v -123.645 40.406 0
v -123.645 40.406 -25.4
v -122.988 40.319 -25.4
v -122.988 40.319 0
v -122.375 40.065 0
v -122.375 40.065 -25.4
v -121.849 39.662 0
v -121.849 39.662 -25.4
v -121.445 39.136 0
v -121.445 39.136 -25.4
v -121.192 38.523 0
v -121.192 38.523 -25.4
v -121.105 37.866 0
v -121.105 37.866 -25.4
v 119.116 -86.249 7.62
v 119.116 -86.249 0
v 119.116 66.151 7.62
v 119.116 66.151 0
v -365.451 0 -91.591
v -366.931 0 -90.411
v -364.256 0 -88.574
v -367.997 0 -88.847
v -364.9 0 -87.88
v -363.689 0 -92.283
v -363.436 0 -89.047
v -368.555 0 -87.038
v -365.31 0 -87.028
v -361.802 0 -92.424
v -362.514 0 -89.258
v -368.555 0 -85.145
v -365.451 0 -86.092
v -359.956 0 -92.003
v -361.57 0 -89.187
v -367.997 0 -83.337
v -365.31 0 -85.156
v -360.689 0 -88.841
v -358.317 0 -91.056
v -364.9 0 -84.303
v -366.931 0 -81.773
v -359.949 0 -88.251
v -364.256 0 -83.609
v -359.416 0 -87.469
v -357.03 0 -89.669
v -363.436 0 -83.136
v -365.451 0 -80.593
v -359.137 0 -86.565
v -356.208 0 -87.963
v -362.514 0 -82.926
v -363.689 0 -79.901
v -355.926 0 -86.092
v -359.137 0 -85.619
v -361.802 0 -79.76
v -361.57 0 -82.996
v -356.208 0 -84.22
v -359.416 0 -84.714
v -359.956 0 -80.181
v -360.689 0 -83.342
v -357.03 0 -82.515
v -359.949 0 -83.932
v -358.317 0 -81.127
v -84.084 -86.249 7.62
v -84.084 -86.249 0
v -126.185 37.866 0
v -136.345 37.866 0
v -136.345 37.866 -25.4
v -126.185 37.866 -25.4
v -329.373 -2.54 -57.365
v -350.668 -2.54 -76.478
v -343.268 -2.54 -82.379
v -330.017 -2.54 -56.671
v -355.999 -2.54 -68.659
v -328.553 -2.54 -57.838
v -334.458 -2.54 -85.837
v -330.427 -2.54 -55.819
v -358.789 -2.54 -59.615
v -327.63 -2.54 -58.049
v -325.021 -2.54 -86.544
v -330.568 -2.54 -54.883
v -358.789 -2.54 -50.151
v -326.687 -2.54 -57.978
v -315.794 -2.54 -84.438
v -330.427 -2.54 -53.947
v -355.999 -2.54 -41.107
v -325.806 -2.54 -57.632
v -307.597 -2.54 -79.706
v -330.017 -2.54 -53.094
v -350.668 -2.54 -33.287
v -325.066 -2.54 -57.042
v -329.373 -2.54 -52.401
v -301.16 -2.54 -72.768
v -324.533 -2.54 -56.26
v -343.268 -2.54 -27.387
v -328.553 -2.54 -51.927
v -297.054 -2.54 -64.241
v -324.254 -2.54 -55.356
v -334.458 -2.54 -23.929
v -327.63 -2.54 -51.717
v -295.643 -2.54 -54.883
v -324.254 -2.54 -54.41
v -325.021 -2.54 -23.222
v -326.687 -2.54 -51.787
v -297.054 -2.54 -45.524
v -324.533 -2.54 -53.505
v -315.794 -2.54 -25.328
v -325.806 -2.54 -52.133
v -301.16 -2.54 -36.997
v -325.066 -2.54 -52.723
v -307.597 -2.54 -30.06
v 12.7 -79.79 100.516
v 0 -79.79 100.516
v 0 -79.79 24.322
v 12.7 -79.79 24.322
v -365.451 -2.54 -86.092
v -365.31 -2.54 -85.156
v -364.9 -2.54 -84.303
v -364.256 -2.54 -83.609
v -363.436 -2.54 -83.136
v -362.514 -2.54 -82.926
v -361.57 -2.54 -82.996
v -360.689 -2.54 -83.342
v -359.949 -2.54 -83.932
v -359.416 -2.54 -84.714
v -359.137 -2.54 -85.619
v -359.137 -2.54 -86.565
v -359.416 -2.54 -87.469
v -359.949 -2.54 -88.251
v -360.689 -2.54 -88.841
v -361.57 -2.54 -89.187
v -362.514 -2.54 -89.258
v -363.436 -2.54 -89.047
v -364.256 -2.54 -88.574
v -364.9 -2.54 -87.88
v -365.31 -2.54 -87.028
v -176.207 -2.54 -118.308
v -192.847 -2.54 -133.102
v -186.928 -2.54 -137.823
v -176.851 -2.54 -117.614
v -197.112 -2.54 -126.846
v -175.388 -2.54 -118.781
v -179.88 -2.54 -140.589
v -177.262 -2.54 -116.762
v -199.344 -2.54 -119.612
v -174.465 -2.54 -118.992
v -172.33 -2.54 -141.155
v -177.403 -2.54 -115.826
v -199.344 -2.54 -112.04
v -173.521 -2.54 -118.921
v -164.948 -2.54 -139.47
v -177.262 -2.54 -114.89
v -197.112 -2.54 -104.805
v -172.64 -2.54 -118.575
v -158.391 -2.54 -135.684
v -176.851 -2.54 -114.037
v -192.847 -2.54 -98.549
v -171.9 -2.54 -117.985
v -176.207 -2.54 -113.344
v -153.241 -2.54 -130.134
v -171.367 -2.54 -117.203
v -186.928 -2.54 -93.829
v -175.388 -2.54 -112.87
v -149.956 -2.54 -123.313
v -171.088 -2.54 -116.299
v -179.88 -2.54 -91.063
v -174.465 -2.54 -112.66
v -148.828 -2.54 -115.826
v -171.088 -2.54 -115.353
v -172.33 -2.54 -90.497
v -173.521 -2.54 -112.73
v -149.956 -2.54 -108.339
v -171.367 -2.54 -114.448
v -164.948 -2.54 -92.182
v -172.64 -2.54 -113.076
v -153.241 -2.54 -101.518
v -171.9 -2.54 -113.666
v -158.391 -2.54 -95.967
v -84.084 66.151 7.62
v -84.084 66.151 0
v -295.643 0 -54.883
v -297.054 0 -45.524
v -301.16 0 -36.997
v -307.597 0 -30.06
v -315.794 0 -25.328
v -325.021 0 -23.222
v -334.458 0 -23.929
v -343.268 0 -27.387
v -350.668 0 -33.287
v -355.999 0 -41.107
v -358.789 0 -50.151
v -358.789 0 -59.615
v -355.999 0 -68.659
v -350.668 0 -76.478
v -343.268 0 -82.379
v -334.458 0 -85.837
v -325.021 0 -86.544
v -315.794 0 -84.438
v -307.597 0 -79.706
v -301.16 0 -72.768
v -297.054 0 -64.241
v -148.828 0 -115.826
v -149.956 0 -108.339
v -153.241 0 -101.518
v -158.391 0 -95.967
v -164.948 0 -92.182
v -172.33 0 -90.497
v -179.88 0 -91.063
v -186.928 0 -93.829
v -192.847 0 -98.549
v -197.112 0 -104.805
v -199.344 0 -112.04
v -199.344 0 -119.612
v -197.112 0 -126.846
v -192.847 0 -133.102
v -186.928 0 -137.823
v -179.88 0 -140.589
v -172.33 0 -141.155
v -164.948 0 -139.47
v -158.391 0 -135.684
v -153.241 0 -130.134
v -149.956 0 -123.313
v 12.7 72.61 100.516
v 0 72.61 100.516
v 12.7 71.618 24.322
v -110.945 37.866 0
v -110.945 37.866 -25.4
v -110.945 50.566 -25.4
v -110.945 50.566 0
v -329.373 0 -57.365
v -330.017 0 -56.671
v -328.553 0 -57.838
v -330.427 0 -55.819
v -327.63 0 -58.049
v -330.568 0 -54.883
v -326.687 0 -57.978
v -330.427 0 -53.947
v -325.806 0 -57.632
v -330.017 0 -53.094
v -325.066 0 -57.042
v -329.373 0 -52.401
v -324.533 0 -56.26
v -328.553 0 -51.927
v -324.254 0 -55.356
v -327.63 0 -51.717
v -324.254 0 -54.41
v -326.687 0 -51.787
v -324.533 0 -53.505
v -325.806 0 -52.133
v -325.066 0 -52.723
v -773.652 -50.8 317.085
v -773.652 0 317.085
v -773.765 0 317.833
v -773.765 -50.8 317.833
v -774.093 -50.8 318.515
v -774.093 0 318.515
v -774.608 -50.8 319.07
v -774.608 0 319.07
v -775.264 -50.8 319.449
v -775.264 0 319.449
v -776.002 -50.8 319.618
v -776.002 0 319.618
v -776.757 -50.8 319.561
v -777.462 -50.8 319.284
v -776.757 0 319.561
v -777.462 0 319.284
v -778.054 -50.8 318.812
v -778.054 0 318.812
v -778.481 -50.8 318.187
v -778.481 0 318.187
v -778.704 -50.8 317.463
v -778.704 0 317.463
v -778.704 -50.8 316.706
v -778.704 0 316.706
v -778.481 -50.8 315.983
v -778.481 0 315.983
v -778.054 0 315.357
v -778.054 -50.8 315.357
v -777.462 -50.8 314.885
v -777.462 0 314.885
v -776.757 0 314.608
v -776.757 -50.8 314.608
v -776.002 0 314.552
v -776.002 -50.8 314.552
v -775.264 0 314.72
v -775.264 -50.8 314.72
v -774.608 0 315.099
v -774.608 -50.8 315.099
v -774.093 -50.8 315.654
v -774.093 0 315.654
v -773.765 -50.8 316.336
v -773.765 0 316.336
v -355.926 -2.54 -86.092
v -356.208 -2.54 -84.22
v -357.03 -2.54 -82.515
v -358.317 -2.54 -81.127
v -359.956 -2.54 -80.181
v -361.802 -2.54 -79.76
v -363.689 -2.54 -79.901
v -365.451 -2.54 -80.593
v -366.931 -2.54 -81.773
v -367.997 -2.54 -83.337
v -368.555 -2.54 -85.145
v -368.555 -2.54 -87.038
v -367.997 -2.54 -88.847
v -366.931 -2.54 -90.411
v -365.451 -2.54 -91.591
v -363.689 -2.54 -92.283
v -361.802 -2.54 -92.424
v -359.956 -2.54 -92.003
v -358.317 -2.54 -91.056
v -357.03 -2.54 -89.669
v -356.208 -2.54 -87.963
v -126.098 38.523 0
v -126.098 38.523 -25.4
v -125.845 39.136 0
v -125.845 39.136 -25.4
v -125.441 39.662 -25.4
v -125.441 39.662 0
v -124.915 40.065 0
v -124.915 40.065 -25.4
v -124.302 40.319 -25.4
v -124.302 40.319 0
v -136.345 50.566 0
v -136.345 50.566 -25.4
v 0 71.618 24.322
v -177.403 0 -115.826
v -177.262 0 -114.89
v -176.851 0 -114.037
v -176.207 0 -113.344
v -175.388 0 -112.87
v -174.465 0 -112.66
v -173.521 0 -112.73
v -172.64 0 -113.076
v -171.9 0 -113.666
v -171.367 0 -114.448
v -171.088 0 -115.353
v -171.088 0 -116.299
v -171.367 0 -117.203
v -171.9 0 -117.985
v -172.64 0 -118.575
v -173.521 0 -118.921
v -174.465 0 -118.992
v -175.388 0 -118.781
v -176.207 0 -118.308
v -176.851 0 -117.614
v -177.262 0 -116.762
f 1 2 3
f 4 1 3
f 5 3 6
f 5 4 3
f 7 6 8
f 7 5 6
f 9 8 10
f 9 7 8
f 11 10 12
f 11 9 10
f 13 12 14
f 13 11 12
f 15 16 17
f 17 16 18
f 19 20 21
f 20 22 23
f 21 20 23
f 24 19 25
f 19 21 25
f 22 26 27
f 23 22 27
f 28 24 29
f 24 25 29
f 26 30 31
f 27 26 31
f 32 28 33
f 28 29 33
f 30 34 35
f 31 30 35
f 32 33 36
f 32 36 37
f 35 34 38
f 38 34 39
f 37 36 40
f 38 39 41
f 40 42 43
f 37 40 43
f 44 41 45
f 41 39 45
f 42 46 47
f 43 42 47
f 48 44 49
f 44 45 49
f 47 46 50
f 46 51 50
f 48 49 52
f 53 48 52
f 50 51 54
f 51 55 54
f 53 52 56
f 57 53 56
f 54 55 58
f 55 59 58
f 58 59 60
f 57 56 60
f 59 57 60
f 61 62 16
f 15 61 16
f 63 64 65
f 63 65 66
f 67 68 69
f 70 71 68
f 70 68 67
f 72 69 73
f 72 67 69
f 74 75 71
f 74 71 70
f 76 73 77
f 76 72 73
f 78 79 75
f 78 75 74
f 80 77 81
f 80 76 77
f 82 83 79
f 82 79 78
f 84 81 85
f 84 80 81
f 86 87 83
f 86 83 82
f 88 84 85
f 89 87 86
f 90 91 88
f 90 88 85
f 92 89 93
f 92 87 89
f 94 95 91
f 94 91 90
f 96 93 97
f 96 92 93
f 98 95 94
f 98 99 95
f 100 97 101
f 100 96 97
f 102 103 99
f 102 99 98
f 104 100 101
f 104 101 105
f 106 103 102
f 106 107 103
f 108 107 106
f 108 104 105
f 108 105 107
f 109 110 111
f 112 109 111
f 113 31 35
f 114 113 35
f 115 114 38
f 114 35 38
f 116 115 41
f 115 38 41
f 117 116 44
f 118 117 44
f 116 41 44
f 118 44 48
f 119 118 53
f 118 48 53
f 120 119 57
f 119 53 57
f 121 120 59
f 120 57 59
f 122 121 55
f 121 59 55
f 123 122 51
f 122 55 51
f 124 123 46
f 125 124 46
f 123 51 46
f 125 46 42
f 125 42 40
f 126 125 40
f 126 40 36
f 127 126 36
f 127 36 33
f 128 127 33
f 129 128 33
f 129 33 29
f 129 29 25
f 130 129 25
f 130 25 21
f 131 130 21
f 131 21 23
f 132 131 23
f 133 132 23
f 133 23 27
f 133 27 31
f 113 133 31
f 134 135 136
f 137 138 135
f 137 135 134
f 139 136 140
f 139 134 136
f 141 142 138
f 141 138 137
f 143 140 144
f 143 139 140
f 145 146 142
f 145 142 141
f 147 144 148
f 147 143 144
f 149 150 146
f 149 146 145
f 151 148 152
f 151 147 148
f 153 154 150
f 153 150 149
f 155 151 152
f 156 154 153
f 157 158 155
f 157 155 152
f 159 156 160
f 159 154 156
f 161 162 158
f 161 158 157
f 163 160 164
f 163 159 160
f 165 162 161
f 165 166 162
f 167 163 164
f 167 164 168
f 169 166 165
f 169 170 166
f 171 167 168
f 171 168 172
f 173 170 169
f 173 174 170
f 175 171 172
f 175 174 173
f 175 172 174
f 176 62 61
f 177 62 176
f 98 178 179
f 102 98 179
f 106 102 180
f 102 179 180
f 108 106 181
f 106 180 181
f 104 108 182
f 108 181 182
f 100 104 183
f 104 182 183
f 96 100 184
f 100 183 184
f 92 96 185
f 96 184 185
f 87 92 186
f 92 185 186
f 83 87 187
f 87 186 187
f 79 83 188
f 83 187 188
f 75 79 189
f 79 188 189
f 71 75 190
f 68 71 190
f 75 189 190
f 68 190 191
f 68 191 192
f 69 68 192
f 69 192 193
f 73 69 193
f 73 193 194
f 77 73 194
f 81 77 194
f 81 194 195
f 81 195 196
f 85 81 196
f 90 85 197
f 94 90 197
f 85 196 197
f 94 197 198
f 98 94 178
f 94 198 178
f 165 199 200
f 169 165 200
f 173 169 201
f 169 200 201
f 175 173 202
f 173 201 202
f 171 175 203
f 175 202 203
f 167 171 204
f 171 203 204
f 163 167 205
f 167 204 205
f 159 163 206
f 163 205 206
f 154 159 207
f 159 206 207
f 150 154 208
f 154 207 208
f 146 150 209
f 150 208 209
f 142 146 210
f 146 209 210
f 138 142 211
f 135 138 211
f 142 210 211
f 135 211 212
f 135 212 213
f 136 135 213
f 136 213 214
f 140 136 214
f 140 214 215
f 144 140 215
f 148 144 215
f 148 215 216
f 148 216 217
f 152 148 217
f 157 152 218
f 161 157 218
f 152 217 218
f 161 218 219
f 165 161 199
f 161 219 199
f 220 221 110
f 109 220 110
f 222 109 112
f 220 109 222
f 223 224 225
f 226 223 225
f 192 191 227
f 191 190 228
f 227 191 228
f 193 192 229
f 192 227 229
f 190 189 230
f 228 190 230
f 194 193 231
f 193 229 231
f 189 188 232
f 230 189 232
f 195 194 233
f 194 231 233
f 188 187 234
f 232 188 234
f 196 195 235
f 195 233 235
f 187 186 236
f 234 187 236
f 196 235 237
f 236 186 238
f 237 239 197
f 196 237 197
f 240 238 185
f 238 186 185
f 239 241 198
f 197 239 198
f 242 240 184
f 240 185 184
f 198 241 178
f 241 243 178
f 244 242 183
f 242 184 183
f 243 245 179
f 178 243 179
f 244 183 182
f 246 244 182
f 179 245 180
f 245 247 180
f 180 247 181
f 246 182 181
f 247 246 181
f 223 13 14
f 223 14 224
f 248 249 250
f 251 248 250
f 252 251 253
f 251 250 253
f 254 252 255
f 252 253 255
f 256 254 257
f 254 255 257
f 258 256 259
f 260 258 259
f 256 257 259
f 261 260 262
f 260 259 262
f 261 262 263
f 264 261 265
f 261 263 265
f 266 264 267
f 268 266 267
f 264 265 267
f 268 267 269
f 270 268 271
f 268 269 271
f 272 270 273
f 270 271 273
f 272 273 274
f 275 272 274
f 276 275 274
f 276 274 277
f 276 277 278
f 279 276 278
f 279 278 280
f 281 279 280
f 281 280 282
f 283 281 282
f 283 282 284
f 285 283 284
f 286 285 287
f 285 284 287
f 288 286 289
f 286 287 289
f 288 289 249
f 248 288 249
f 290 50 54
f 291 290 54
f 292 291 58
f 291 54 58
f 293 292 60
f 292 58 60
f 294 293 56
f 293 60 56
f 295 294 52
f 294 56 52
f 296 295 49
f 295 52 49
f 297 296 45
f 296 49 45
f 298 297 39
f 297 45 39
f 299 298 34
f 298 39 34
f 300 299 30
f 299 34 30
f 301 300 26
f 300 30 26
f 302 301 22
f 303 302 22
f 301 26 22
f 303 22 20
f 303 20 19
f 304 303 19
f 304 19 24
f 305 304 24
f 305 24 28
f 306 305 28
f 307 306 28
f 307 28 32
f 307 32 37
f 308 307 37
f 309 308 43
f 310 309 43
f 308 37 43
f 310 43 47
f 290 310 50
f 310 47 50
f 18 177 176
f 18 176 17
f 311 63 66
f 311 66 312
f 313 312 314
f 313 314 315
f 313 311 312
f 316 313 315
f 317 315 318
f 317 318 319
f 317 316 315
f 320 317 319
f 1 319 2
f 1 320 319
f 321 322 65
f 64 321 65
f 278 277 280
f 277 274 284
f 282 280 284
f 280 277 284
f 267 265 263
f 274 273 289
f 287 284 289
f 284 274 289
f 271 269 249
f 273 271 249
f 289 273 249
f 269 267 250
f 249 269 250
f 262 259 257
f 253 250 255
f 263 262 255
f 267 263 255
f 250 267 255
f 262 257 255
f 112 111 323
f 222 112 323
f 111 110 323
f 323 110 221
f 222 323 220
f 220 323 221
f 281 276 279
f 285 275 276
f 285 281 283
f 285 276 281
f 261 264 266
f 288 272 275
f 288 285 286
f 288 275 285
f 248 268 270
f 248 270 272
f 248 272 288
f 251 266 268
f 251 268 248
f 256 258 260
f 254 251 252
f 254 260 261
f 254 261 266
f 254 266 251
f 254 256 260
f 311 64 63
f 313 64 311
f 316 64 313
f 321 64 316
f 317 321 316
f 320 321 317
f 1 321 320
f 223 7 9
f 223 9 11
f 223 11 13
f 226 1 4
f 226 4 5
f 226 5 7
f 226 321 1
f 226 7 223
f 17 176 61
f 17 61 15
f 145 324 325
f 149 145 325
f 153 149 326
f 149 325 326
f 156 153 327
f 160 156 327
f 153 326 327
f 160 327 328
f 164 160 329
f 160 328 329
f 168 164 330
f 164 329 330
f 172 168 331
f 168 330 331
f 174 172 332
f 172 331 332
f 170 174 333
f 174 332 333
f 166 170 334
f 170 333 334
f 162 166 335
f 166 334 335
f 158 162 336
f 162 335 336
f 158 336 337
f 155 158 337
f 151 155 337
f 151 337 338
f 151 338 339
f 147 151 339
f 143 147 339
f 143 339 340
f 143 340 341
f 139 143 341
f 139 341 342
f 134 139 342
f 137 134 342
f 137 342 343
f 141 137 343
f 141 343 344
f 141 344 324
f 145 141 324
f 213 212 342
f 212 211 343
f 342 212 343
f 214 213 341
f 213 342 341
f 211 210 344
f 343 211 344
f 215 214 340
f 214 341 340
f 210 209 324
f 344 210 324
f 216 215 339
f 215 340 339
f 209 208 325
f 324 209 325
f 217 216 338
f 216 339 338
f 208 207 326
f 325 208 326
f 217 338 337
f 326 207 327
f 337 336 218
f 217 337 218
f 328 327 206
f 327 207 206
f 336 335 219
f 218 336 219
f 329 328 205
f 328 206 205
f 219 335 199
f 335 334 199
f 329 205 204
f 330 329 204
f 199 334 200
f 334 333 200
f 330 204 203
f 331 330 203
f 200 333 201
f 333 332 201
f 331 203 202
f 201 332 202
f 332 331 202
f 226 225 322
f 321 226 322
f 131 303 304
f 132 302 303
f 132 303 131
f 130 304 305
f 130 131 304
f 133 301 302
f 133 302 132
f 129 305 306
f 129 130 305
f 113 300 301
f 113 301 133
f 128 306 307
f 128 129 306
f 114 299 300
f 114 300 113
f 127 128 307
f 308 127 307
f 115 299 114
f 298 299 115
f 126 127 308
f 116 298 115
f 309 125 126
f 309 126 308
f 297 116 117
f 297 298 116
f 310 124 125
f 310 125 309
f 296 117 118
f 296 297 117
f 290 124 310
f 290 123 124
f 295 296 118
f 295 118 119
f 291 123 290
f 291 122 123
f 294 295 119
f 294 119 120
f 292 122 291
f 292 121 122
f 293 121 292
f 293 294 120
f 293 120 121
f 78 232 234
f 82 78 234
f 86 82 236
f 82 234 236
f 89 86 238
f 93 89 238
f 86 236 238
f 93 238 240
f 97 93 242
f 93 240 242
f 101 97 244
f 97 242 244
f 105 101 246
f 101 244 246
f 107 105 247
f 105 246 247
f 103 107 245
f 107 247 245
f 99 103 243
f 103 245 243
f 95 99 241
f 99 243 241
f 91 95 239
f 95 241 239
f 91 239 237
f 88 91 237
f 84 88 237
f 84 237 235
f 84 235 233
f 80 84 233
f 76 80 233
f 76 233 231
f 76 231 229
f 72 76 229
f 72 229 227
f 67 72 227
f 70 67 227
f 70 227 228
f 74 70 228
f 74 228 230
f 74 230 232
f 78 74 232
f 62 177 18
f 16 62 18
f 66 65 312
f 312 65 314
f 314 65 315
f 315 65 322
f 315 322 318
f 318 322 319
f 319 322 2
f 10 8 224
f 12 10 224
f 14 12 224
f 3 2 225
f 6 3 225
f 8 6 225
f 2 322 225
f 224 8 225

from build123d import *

# Parameters (mm, degrees)
F0_W     = 203.2
F0_H     = 152.4
F1_DEPTH = 7.62
F3_DEPTH = 12.7
F5_DEPTH = 25.4
F6_R     = 2.54
F7_DEPTH = 50.8
F8_R     = 31.75
F9_DEPTH = 2.54
F8_R_2   = 6.35
F8_R_3   = 25.4
F11_D    = 6.35
F13_D    = 6.35
F15_D    = 6.35


with BuildPart() as f1:
    # F0 (on Top) → F1 (new body)
    with BuildSketch(Plane.XY):
        with Locations((17.5161063671, -10.0485615241)):
            Rectangle(F0_W, F0_H)
    extrude(amount=F1_DEPTH)


with BuildPart() as f3:
    # F2 (on Right) → F3 (new body)
    with BuildSketch(Plane.YZ):
        Polygon((71.6178634355, 24.3219571736), (72.6095994812, 100.5155032232), (-79.7904005188, 100.5155032232), (-79.7904005188, 24.3219571736), align=None)
    extrude(amount=F3_DEPTH)


with BuildPart() as f5:
    # F4 (on Top) → F5 (new body)
    with BuildSketch(Plane.XY):
        with BuildLine():
            Line((-123.6449740827, 50.5655002038), (-136.3449740827, 50.5655002038))
            Line((-136.3449740827, 50.5655002038), (-136.3449740827, 37.8655002038))
            Line((-136.3449740827, 37.8655002038), (-126.1849740827, 37.8655002038))
            ThreePointArc((-126.1849740827, 37.8655002038), (-125.4410253069, 39.6615514281), (-123.6449740827, 40.4055002038))
            Line((-123.6449740827, 40.4055002038), (-123.6449740827, 50.5655002038))
        make_face()
        with BuildLine():
            Line((-110.9449740827, 50.5655002038), (-123.6449740827, 50.5655002038))
            Line((-123.6449740827, 50.5655002038), (-123.6449740827, 40.4055002038))
            ThreePointArc((-123.6449740827, 40.4055002038), (-121.8489228585, 39.6615514281), (-121.1049740827, 37.8655002038))
            Line((-121.1049740827, 37.8655002038), (-110.9449740827, 37.8655002038))
            Line((-110.9449740827, 37.8655002038), (-110.9449740827, 50.5655002038))
        make_face()
    extrude(amount=-F5_DEPTH)


with BuildPart() as f7:
    # F6 (on Front) → F7 (new body)
    with BuildSketch(Plane.XZ):
        with Locations((-776.1920690536, 317.0846104622)):
            Circle(F6_R)
    extrude(amount=F7_DEPTH)


with BuildPart() as f9:
    # F8 (on Front) → F9 (new body)
    with BuildSketch(Plane.XZ):
        with Locations((-327.3932203081, -54.8828672849)):
            Circle(F8_R)
    extrude(amount=F9_DEPTH)

    # F11 (through all)
    with Locations(Plane.XZ.offset(2.54)):
        with Locations((-327.3932203081, -54.8828672849)):
            Hole(F11_D / 2)


with BuildPart() as f9b:
    # F8 (on Front) → F9, piece 2 (new body)
    with BuildSketch(Plane.XZ):
        with Locations((-362.2763366705, -86.0917933375)):
            Circle(F8_R_2)
    extrude(amount=F9_DEPTH)

    # F13 (through all)
    with Locations(Plane.XZ.offset(2.54)):
        with Locations((-362.2763366705, -86.0917933375)):
            Hole(F13_D / 2)


with BuildPart() as f9c:
    # F8 (on Front) → F9, piece 3 (new body)
    with BuildSketch(Plane.XZ):
        with Locations((-174.2277592421, -115.8258467913)):
            Circle(F8_R_3)
    extrude(amount=F9_DEPTH)

    # F15 (through all)
    with Locations(Plane.XZ.offset(2.54)):
        with Locations((-174.2277592421, -115.8258467913)):
            Hole(F15_D / 2)


solid = Compound([f1.part, f3.part, f5.part, f7.part, f9.part, f9b.part, f9c.part])
